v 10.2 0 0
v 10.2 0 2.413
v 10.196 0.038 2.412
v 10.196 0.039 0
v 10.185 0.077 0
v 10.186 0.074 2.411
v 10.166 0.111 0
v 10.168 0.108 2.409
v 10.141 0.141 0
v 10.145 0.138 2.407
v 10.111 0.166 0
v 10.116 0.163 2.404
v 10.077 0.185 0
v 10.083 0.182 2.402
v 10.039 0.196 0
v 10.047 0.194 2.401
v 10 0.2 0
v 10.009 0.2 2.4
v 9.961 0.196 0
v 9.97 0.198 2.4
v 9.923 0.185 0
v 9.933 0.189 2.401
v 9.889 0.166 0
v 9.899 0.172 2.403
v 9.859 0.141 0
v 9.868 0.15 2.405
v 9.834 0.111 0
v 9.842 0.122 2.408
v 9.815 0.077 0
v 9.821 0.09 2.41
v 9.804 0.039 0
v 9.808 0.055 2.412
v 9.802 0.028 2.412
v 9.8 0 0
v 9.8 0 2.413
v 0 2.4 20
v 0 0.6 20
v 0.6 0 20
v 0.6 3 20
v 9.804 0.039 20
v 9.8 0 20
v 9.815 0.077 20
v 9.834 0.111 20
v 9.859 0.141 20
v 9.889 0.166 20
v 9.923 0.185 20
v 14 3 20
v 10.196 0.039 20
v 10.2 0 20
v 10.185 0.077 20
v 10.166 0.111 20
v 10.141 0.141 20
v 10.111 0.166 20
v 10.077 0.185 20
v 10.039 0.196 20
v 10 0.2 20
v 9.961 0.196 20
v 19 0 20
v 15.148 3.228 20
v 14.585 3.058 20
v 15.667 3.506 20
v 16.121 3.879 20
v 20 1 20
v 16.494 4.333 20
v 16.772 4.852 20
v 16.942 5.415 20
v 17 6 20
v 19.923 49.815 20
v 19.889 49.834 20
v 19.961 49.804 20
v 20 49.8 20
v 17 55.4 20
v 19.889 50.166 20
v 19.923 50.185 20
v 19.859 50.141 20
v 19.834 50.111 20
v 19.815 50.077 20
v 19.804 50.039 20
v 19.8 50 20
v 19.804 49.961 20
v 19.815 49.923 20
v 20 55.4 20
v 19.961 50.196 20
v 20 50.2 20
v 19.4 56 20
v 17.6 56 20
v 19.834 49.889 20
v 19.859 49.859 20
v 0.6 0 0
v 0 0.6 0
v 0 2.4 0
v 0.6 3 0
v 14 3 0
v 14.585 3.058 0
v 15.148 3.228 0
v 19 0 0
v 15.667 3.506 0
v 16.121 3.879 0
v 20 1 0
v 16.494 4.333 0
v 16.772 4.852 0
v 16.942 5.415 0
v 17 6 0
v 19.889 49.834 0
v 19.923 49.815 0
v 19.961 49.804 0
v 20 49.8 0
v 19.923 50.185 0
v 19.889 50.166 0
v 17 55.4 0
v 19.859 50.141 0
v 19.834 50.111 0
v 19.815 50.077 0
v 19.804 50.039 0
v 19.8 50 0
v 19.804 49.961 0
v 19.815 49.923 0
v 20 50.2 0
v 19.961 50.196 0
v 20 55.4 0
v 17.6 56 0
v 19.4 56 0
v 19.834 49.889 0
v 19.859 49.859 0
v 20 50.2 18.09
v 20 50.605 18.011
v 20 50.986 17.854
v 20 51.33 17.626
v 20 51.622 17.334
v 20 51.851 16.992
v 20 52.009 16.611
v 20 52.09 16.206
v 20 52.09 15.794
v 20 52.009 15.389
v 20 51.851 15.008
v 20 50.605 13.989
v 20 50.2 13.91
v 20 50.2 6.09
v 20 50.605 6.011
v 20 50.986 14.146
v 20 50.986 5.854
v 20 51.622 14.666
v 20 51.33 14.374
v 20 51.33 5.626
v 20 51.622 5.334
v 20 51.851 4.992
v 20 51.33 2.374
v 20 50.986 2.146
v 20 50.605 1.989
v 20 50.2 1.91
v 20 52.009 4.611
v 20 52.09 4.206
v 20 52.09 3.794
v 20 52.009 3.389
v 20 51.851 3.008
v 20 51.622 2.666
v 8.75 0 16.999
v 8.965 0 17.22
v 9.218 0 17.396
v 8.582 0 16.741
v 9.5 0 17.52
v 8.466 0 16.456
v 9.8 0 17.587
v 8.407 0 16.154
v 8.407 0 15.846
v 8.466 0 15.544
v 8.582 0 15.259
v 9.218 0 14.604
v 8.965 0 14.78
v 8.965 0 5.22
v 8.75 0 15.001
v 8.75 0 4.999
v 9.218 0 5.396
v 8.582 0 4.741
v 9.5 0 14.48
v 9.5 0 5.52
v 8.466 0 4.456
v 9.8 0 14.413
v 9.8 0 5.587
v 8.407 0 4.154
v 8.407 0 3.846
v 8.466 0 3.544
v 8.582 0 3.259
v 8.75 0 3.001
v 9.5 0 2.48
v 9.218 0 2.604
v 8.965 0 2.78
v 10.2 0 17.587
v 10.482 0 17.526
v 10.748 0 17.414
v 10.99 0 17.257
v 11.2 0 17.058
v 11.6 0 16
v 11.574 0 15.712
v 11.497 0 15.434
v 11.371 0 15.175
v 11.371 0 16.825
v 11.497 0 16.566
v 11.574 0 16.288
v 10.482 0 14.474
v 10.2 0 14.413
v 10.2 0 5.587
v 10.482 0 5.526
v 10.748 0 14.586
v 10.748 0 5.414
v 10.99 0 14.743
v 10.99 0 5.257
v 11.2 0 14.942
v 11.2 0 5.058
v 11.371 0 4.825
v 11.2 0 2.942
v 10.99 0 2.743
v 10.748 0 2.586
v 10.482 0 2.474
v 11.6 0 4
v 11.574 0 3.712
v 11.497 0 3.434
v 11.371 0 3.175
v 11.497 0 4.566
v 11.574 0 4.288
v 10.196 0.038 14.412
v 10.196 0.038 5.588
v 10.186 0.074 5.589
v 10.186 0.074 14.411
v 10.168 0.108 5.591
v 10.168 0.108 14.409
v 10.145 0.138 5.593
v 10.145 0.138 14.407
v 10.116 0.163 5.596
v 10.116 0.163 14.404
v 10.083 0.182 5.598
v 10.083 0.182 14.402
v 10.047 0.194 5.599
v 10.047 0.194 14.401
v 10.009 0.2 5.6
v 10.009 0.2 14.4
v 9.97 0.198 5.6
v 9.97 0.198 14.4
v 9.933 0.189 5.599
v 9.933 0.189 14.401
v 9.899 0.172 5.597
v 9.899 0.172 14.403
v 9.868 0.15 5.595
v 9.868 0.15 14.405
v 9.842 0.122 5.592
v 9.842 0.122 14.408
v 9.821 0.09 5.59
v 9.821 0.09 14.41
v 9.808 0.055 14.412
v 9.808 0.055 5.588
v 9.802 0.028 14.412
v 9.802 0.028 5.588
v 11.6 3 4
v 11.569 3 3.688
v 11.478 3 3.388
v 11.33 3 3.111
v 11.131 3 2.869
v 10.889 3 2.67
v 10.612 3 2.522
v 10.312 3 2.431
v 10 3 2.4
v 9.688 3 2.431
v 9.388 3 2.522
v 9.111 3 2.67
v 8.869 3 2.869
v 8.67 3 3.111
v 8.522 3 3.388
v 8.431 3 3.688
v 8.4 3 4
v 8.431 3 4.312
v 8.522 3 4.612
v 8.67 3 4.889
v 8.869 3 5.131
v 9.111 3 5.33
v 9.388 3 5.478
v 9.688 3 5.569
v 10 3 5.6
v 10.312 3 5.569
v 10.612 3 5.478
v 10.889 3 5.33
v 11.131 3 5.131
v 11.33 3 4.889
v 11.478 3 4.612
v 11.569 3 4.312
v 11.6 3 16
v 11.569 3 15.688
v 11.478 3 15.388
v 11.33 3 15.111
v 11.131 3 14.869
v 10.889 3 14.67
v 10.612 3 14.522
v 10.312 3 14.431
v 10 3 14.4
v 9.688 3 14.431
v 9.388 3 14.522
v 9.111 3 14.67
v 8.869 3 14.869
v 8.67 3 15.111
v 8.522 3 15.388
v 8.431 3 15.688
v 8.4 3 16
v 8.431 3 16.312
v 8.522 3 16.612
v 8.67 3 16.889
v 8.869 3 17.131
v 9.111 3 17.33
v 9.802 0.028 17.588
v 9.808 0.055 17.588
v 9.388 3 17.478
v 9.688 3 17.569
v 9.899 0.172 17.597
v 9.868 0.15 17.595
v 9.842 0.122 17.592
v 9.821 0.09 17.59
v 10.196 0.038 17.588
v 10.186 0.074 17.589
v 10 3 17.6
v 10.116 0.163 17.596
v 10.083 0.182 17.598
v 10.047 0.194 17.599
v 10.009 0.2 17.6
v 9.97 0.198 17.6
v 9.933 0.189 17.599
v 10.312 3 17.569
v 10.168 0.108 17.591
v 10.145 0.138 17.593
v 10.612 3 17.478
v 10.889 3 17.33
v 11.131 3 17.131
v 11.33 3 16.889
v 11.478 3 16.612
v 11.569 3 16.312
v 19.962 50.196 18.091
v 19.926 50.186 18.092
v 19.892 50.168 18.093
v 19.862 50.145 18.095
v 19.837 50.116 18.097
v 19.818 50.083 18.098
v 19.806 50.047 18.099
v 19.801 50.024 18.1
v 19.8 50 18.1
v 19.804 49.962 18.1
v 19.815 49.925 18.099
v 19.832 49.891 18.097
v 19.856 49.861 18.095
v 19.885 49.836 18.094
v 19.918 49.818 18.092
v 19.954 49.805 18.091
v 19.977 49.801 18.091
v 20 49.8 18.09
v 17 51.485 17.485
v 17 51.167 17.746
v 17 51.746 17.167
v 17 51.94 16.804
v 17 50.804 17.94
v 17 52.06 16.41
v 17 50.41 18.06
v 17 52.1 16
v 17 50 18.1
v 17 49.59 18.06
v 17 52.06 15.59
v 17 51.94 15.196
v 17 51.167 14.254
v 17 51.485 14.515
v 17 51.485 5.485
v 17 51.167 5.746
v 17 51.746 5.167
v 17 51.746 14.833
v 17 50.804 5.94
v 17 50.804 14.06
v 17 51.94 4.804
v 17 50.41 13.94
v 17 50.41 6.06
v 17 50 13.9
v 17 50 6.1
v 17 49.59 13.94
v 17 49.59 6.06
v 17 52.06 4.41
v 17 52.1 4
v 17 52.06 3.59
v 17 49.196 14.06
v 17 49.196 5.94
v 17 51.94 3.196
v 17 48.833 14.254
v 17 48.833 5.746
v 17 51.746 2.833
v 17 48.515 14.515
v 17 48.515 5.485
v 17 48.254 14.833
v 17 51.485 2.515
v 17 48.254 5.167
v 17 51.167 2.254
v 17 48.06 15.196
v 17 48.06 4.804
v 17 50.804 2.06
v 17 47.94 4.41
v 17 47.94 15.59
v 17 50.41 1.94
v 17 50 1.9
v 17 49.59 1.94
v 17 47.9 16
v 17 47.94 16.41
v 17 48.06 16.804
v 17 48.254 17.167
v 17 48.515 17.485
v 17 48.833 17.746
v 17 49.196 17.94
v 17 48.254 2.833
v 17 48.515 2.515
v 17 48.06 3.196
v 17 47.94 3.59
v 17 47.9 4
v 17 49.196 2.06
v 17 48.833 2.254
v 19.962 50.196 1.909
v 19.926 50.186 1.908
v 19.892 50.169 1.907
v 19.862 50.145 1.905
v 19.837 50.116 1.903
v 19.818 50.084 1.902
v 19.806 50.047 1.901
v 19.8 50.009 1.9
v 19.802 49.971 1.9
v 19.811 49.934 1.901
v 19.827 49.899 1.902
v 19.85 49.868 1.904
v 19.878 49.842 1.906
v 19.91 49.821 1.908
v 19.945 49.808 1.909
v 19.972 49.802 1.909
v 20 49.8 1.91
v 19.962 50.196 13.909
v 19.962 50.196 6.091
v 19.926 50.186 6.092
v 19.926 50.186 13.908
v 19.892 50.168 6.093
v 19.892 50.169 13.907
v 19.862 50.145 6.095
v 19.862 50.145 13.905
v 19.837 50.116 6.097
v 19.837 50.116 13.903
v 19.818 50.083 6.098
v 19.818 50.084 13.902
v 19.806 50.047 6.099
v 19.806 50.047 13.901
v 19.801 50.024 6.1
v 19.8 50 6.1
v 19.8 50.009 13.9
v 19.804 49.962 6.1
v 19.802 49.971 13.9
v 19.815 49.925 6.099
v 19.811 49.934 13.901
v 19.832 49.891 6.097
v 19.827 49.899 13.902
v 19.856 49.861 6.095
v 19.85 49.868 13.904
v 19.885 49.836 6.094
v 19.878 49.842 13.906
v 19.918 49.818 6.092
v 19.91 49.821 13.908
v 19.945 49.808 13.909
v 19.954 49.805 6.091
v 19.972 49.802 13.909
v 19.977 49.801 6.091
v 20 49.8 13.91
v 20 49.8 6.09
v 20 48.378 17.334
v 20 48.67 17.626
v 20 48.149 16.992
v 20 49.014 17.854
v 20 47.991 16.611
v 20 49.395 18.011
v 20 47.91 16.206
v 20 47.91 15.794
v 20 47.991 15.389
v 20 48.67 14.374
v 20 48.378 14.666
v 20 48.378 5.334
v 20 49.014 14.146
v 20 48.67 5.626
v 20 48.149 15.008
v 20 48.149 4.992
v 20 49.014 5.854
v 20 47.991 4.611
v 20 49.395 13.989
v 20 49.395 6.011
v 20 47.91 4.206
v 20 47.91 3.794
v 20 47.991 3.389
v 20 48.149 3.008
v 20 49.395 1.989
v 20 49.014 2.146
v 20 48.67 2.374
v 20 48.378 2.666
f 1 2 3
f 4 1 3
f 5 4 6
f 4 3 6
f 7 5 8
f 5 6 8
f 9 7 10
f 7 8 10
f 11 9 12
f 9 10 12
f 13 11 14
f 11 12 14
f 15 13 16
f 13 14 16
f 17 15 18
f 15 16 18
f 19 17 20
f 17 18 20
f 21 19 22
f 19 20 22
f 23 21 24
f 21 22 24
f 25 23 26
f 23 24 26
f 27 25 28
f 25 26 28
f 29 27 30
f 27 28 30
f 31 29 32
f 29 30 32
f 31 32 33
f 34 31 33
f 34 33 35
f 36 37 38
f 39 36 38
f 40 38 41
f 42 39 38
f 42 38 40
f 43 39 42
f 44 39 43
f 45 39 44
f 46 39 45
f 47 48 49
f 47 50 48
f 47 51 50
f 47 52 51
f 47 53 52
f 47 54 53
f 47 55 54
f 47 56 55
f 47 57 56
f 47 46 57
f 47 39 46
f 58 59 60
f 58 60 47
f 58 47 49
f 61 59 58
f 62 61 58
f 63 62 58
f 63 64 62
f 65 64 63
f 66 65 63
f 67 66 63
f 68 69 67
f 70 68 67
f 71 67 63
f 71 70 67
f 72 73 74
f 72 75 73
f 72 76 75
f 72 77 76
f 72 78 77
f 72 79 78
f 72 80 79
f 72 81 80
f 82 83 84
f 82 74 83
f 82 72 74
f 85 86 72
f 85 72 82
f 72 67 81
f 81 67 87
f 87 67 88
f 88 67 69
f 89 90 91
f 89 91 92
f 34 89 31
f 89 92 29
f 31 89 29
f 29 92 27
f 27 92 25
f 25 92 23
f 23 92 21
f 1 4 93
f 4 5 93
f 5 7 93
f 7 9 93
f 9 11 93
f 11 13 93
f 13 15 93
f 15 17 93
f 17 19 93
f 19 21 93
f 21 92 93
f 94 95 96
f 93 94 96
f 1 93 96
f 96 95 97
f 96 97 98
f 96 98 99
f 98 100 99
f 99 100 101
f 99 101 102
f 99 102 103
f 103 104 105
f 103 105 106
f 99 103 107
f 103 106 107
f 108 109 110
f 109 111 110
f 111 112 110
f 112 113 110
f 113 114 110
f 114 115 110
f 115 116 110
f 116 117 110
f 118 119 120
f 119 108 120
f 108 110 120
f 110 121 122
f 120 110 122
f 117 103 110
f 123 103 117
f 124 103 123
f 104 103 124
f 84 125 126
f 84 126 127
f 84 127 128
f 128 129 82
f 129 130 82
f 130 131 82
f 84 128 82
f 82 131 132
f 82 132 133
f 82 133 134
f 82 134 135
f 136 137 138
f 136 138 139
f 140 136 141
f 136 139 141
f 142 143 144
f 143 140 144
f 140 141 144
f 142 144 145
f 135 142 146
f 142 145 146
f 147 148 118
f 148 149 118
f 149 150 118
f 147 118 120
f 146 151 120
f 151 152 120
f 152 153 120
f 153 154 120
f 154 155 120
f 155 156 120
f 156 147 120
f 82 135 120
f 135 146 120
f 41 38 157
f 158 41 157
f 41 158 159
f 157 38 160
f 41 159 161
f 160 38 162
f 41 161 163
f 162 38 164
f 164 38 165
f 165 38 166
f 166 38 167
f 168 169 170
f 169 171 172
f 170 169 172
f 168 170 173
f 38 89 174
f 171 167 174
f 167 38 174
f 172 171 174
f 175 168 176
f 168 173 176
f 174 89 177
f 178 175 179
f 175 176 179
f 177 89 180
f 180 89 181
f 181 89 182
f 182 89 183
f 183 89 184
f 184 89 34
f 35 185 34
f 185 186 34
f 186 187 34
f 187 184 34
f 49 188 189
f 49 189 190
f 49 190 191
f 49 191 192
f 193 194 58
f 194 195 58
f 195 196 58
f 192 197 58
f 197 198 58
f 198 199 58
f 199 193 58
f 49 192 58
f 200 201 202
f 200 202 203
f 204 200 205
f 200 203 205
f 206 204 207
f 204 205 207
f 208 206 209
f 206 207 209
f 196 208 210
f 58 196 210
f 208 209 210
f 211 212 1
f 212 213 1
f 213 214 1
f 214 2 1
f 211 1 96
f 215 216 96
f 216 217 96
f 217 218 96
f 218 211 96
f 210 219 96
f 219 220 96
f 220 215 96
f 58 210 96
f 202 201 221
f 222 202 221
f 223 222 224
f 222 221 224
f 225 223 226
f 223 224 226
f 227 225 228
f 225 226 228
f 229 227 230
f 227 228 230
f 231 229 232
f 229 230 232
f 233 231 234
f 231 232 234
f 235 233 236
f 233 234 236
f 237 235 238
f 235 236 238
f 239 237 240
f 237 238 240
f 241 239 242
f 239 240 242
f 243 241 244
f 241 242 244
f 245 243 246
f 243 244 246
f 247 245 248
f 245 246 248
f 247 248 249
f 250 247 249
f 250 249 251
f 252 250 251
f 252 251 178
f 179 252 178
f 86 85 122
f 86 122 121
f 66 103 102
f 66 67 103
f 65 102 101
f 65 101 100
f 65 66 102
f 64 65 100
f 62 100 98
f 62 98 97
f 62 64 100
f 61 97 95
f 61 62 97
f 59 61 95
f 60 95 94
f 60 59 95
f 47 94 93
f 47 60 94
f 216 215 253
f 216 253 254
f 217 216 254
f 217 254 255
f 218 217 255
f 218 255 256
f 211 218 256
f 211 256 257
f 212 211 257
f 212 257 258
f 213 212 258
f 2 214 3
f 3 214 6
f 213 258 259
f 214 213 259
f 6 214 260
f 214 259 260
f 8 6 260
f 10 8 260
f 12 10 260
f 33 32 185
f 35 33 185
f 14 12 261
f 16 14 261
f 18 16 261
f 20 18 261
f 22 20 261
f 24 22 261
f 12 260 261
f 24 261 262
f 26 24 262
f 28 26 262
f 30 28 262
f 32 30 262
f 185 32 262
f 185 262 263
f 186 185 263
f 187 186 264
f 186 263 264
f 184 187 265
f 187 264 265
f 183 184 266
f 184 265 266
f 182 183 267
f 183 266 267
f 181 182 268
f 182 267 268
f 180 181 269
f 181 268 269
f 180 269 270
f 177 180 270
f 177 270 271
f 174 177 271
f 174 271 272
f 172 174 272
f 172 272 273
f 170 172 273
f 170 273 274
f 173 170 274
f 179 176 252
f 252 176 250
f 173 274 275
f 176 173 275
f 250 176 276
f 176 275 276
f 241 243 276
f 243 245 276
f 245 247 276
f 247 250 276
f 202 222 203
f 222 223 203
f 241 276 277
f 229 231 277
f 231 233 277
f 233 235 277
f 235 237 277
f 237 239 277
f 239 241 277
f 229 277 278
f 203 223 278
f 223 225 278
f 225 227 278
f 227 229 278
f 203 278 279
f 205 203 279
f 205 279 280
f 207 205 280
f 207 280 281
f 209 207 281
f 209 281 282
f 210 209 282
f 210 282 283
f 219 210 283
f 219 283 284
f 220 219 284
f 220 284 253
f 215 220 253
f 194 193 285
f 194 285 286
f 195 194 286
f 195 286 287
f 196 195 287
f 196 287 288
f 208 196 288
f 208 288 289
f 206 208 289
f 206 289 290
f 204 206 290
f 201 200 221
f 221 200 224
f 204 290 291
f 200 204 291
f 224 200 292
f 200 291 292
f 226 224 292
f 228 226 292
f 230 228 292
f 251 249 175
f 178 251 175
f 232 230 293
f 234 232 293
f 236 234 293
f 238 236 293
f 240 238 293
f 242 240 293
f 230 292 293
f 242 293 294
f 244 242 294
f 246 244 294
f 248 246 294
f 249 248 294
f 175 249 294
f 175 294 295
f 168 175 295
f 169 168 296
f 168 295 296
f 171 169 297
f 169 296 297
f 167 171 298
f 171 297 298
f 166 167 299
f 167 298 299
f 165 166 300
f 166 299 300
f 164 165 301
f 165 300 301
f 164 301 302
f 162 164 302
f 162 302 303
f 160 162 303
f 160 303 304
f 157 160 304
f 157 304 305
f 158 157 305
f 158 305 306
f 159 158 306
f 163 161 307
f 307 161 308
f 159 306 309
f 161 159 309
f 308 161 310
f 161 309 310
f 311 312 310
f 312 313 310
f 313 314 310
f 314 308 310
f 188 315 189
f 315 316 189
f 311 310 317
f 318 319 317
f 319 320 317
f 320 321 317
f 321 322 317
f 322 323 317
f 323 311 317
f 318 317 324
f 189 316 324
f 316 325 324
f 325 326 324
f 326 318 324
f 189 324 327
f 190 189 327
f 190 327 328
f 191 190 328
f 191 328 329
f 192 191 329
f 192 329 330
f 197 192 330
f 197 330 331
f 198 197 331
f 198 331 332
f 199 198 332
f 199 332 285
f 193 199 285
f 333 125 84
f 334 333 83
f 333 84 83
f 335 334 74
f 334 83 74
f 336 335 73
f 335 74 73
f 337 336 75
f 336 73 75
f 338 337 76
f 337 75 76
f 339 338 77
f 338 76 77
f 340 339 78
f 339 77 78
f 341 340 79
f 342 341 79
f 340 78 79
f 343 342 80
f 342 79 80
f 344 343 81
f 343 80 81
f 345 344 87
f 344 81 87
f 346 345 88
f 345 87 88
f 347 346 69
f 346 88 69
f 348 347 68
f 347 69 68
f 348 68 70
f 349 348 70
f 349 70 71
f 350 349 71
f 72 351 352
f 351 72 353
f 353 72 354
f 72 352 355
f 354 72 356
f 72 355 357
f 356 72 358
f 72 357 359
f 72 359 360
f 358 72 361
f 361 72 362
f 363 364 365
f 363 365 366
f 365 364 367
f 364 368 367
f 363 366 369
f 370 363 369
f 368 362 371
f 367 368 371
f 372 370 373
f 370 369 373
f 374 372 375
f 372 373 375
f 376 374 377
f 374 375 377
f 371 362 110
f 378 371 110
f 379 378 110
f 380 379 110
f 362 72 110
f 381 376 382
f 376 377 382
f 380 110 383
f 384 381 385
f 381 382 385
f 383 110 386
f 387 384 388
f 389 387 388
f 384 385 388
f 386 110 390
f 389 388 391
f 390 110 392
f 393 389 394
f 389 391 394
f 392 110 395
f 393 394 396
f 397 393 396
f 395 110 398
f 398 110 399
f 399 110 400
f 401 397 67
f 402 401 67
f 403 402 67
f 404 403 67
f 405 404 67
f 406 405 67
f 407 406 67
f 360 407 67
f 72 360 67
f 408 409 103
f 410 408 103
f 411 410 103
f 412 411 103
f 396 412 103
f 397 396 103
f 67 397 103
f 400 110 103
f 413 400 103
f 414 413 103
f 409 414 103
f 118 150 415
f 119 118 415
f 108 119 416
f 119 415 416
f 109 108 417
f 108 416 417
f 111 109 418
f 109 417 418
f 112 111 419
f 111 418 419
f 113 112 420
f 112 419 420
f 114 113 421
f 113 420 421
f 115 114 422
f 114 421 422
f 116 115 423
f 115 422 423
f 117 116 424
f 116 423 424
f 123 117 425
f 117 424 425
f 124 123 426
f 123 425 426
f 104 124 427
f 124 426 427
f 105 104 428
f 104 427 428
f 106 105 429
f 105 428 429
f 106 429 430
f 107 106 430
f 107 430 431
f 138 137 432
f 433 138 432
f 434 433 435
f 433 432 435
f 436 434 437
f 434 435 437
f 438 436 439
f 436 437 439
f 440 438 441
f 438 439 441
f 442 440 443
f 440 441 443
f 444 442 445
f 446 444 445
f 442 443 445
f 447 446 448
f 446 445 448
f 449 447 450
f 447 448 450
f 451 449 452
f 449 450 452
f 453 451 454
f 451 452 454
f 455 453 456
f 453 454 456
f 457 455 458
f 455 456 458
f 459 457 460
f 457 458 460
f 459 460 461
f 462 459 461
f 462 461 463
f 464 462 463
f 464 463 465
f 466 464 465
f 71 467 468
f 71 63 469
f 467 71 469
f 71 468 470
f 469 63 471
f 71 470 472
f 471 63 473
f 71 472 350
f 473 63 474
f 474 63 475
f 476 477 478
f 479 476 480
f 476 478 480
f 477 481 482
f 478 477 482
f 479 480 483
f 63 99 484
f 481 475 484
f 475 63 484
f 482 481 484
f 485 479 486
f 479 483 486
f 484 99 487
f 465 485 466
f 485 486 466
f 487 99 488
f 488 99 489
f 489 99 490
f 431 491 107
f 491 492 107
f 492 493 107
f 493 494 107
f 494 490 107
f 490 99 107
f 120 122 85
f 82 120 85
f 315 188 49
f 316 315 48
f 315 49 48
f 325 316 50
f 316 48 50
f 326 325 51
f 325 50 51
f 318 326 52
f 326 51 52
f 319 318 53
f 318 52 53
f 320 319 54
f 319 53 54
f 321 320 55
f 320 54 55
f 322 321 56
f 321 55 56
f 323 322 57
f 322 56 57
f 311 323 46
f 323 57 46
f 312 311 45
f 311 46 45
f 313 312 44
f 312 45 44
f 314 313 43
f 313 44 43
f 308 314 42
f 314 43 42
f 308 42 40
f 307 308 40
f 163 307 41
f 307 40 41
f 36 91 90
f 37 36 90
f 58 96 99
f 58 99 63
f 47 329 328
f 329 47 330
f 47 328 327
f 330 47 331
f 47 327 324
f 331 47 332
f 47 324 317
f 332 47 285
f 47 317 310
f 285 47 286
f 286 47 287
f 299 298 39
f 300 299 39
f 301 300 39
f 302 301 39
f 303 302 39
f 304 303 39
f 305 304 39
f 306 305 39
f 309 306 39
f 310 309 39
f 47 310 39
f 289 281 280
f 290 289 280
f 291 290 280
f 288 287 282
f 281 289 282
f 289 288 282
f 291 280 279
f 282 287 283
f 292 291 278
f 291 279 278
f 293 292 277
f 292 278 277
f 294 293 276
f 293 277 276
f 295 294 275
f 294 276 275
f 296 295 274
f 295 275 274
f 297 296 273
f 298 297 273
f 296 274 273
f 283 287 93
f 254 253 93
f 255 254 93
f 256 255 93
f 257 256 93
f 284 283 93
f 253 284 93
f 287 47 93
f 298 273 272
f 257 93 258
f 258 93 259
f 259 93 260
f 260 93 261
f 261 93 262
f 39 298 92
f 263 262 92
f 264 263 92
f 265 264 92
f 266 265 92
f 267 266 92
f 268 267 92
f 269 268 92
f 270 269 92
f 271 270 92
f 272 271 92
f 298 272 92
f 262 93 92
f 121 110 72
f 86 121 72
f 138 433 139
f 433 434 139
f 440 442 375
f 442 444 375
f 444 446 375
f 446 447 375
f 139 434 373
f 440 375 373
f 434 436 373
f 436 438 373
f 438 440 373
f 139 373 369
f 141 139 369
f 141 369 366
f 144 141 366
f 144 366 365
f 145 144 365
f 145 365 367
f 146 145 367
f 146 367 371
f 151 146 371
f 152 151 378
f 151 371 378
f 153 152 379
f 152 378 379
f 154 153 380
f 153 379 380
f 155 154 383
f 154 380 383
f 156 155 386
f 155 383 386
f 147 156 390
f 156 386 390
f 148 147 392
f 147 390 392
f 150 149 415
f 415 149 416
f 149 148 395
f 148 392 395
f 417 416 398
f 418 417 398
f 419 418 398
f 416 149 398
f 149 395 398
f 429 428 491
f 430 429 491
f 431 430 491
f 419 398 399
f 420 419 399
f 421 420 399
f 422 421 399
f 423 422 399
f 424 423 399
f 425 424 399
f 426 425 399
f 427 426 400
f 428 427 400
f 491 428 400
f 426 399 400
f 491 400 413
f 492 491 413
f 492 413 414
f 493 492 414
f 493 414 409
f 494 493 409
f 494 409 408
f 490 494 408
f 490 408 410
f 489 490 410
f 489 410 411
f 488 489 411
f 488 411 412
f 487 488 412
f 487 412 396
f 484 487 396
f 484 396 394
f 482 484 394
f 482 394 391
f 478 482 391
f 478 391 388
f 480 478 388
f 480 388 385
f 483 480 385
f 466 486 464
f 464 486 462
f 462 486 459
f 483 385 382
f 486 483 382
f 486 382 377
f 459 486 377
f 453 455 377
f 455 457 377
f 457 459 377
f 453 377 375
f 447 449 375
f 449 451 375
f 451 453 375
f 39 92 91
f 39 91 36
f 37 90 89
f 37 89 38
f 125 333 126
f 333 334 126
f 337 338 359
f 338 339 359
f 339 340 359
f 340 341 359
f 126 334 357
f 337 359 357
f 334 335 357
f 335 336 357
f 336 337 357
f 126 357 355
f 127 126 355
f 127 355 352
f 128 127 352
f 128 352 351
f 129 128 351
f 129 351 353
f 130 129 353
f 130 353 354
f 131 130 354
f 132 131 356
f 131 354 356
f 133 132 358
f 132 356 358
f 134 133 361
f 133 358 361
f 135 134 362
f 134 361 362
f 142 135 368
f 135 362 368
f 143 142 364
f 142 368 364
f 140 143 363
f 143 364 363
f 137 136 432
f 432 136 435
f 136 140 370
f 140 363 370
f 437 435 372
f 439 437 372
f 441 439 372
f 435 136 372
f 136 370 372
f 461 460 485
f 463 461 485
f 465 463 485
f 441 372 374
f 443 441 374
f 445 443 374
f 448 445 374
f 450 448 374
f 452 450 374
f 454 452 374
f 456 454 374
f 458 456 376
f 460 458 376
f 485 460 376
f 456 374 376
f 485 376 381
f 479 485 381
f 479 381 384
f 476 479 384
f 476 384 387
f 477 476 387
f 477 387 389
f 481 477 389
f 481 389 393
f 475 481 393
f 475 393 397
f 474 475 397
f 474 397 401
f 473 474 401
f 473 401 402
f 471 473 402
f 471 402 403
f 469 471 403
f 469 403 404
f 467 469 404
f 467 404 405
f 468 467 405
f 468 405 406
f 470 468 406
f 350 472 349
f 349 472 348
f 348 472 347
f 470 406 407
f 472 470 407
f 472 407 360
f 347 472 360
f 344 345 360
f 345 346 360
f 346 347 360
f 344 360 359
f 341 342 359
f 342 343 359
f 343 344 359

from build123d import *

# Parameters (mm, degrees)
EXTRUDE_1_DEPTH     = 20
FILLET_1_R          = 3
SKETCH_2_R          = 2.1
CUT_EXTRUDE_1_DEPTH = 20
SKETCH_3_R          = 1.6
CUT_EXTRUDE_2_DEPTH = 20
CHAMFER_1_SIZE      = 1
CHAMFER_2_SIZE      = 0.6
SKETCH_4_R          = 0.2
CUT_EXTRUDE_3_DEPTH = 32


with BuildPart() as part:
    # 草图1 → 凸台-拉伸1 (new body)
    with BuildSketch(Plane.XY):
        Polygon((0, 0), (20, 0), (20, 56), (17, 56), (17, 3), (0, 3), align=None)
    extrude(amount=EXTRUDE_1_DEPTH)

    # 圆角1
    fillet_1_edges = [part.edges().sort_by_distance(p)[0] for p in [
        (17, 3, 10),
    ]]
    fillet(fillet_1_edges, radius=FILLET_1_R)

    # 草图2 → 切除-拉伸1 (cut)
    with BuildSketch(Plane.ZY.offset(-17)):
        with Locations((4, 50)):
            Circle(SKETCH_2_R)
        with Locations((16, 50)):
            Circle(SKETCH_2_R)
    extrude(amount=-CUT_EXTRUDE_1_DEPTH, mode=Mode.SUBTRACT)

    # 草图3 → 切除-拉伸2 (cut)
    with BuildSketch(Plane(origin=(0, 3, 0), x_dir=(1, 0, 0), z_dir=(0, 1, 0))):
        with Locations((10, -4)):
            Circle(SKETCH_3_R)
        with Locations((10, -16)):
            Circle(SKETCH_3_R)
    extrude(amount=-CUT_EXTRUDE_2_DEPTH, mode=Mode.SUBTRACT)

    # 倒角1
    chamfer_1_edges = [part.edges().sort_by_distance(p)[0] for p in [
        (20, 0, 10),
    ]]
    chamfer(chamfer_1_edges, length=CHAMFER_1_SIZE)

    # 倒角2
    chamfer_2_edges = [part.edges().sort_by_distance(p)[0] for p in [
        (0, 3, 10),
        (17, 56, 10),
        (20, 56, 10),
        (0, 0, 10),
    ]]
    chamfer(chamfer_2_edges, length=CHAMFER_2_SIZE)

    # 草图4 → 切除-拉伸3 (cut)
    with BuildSketch(Plane.XY.offset(20)):
        with Locations((10, 0)):
            Circle(SKETCH_4_R)
        with Locations((20, 50)):
            Circle(SKETCH_4_R)
    extrude(amount=-CUT_EXTRUDE_3_DEPTH, mode=Mode.SUBTRACT)


solid = part.part
